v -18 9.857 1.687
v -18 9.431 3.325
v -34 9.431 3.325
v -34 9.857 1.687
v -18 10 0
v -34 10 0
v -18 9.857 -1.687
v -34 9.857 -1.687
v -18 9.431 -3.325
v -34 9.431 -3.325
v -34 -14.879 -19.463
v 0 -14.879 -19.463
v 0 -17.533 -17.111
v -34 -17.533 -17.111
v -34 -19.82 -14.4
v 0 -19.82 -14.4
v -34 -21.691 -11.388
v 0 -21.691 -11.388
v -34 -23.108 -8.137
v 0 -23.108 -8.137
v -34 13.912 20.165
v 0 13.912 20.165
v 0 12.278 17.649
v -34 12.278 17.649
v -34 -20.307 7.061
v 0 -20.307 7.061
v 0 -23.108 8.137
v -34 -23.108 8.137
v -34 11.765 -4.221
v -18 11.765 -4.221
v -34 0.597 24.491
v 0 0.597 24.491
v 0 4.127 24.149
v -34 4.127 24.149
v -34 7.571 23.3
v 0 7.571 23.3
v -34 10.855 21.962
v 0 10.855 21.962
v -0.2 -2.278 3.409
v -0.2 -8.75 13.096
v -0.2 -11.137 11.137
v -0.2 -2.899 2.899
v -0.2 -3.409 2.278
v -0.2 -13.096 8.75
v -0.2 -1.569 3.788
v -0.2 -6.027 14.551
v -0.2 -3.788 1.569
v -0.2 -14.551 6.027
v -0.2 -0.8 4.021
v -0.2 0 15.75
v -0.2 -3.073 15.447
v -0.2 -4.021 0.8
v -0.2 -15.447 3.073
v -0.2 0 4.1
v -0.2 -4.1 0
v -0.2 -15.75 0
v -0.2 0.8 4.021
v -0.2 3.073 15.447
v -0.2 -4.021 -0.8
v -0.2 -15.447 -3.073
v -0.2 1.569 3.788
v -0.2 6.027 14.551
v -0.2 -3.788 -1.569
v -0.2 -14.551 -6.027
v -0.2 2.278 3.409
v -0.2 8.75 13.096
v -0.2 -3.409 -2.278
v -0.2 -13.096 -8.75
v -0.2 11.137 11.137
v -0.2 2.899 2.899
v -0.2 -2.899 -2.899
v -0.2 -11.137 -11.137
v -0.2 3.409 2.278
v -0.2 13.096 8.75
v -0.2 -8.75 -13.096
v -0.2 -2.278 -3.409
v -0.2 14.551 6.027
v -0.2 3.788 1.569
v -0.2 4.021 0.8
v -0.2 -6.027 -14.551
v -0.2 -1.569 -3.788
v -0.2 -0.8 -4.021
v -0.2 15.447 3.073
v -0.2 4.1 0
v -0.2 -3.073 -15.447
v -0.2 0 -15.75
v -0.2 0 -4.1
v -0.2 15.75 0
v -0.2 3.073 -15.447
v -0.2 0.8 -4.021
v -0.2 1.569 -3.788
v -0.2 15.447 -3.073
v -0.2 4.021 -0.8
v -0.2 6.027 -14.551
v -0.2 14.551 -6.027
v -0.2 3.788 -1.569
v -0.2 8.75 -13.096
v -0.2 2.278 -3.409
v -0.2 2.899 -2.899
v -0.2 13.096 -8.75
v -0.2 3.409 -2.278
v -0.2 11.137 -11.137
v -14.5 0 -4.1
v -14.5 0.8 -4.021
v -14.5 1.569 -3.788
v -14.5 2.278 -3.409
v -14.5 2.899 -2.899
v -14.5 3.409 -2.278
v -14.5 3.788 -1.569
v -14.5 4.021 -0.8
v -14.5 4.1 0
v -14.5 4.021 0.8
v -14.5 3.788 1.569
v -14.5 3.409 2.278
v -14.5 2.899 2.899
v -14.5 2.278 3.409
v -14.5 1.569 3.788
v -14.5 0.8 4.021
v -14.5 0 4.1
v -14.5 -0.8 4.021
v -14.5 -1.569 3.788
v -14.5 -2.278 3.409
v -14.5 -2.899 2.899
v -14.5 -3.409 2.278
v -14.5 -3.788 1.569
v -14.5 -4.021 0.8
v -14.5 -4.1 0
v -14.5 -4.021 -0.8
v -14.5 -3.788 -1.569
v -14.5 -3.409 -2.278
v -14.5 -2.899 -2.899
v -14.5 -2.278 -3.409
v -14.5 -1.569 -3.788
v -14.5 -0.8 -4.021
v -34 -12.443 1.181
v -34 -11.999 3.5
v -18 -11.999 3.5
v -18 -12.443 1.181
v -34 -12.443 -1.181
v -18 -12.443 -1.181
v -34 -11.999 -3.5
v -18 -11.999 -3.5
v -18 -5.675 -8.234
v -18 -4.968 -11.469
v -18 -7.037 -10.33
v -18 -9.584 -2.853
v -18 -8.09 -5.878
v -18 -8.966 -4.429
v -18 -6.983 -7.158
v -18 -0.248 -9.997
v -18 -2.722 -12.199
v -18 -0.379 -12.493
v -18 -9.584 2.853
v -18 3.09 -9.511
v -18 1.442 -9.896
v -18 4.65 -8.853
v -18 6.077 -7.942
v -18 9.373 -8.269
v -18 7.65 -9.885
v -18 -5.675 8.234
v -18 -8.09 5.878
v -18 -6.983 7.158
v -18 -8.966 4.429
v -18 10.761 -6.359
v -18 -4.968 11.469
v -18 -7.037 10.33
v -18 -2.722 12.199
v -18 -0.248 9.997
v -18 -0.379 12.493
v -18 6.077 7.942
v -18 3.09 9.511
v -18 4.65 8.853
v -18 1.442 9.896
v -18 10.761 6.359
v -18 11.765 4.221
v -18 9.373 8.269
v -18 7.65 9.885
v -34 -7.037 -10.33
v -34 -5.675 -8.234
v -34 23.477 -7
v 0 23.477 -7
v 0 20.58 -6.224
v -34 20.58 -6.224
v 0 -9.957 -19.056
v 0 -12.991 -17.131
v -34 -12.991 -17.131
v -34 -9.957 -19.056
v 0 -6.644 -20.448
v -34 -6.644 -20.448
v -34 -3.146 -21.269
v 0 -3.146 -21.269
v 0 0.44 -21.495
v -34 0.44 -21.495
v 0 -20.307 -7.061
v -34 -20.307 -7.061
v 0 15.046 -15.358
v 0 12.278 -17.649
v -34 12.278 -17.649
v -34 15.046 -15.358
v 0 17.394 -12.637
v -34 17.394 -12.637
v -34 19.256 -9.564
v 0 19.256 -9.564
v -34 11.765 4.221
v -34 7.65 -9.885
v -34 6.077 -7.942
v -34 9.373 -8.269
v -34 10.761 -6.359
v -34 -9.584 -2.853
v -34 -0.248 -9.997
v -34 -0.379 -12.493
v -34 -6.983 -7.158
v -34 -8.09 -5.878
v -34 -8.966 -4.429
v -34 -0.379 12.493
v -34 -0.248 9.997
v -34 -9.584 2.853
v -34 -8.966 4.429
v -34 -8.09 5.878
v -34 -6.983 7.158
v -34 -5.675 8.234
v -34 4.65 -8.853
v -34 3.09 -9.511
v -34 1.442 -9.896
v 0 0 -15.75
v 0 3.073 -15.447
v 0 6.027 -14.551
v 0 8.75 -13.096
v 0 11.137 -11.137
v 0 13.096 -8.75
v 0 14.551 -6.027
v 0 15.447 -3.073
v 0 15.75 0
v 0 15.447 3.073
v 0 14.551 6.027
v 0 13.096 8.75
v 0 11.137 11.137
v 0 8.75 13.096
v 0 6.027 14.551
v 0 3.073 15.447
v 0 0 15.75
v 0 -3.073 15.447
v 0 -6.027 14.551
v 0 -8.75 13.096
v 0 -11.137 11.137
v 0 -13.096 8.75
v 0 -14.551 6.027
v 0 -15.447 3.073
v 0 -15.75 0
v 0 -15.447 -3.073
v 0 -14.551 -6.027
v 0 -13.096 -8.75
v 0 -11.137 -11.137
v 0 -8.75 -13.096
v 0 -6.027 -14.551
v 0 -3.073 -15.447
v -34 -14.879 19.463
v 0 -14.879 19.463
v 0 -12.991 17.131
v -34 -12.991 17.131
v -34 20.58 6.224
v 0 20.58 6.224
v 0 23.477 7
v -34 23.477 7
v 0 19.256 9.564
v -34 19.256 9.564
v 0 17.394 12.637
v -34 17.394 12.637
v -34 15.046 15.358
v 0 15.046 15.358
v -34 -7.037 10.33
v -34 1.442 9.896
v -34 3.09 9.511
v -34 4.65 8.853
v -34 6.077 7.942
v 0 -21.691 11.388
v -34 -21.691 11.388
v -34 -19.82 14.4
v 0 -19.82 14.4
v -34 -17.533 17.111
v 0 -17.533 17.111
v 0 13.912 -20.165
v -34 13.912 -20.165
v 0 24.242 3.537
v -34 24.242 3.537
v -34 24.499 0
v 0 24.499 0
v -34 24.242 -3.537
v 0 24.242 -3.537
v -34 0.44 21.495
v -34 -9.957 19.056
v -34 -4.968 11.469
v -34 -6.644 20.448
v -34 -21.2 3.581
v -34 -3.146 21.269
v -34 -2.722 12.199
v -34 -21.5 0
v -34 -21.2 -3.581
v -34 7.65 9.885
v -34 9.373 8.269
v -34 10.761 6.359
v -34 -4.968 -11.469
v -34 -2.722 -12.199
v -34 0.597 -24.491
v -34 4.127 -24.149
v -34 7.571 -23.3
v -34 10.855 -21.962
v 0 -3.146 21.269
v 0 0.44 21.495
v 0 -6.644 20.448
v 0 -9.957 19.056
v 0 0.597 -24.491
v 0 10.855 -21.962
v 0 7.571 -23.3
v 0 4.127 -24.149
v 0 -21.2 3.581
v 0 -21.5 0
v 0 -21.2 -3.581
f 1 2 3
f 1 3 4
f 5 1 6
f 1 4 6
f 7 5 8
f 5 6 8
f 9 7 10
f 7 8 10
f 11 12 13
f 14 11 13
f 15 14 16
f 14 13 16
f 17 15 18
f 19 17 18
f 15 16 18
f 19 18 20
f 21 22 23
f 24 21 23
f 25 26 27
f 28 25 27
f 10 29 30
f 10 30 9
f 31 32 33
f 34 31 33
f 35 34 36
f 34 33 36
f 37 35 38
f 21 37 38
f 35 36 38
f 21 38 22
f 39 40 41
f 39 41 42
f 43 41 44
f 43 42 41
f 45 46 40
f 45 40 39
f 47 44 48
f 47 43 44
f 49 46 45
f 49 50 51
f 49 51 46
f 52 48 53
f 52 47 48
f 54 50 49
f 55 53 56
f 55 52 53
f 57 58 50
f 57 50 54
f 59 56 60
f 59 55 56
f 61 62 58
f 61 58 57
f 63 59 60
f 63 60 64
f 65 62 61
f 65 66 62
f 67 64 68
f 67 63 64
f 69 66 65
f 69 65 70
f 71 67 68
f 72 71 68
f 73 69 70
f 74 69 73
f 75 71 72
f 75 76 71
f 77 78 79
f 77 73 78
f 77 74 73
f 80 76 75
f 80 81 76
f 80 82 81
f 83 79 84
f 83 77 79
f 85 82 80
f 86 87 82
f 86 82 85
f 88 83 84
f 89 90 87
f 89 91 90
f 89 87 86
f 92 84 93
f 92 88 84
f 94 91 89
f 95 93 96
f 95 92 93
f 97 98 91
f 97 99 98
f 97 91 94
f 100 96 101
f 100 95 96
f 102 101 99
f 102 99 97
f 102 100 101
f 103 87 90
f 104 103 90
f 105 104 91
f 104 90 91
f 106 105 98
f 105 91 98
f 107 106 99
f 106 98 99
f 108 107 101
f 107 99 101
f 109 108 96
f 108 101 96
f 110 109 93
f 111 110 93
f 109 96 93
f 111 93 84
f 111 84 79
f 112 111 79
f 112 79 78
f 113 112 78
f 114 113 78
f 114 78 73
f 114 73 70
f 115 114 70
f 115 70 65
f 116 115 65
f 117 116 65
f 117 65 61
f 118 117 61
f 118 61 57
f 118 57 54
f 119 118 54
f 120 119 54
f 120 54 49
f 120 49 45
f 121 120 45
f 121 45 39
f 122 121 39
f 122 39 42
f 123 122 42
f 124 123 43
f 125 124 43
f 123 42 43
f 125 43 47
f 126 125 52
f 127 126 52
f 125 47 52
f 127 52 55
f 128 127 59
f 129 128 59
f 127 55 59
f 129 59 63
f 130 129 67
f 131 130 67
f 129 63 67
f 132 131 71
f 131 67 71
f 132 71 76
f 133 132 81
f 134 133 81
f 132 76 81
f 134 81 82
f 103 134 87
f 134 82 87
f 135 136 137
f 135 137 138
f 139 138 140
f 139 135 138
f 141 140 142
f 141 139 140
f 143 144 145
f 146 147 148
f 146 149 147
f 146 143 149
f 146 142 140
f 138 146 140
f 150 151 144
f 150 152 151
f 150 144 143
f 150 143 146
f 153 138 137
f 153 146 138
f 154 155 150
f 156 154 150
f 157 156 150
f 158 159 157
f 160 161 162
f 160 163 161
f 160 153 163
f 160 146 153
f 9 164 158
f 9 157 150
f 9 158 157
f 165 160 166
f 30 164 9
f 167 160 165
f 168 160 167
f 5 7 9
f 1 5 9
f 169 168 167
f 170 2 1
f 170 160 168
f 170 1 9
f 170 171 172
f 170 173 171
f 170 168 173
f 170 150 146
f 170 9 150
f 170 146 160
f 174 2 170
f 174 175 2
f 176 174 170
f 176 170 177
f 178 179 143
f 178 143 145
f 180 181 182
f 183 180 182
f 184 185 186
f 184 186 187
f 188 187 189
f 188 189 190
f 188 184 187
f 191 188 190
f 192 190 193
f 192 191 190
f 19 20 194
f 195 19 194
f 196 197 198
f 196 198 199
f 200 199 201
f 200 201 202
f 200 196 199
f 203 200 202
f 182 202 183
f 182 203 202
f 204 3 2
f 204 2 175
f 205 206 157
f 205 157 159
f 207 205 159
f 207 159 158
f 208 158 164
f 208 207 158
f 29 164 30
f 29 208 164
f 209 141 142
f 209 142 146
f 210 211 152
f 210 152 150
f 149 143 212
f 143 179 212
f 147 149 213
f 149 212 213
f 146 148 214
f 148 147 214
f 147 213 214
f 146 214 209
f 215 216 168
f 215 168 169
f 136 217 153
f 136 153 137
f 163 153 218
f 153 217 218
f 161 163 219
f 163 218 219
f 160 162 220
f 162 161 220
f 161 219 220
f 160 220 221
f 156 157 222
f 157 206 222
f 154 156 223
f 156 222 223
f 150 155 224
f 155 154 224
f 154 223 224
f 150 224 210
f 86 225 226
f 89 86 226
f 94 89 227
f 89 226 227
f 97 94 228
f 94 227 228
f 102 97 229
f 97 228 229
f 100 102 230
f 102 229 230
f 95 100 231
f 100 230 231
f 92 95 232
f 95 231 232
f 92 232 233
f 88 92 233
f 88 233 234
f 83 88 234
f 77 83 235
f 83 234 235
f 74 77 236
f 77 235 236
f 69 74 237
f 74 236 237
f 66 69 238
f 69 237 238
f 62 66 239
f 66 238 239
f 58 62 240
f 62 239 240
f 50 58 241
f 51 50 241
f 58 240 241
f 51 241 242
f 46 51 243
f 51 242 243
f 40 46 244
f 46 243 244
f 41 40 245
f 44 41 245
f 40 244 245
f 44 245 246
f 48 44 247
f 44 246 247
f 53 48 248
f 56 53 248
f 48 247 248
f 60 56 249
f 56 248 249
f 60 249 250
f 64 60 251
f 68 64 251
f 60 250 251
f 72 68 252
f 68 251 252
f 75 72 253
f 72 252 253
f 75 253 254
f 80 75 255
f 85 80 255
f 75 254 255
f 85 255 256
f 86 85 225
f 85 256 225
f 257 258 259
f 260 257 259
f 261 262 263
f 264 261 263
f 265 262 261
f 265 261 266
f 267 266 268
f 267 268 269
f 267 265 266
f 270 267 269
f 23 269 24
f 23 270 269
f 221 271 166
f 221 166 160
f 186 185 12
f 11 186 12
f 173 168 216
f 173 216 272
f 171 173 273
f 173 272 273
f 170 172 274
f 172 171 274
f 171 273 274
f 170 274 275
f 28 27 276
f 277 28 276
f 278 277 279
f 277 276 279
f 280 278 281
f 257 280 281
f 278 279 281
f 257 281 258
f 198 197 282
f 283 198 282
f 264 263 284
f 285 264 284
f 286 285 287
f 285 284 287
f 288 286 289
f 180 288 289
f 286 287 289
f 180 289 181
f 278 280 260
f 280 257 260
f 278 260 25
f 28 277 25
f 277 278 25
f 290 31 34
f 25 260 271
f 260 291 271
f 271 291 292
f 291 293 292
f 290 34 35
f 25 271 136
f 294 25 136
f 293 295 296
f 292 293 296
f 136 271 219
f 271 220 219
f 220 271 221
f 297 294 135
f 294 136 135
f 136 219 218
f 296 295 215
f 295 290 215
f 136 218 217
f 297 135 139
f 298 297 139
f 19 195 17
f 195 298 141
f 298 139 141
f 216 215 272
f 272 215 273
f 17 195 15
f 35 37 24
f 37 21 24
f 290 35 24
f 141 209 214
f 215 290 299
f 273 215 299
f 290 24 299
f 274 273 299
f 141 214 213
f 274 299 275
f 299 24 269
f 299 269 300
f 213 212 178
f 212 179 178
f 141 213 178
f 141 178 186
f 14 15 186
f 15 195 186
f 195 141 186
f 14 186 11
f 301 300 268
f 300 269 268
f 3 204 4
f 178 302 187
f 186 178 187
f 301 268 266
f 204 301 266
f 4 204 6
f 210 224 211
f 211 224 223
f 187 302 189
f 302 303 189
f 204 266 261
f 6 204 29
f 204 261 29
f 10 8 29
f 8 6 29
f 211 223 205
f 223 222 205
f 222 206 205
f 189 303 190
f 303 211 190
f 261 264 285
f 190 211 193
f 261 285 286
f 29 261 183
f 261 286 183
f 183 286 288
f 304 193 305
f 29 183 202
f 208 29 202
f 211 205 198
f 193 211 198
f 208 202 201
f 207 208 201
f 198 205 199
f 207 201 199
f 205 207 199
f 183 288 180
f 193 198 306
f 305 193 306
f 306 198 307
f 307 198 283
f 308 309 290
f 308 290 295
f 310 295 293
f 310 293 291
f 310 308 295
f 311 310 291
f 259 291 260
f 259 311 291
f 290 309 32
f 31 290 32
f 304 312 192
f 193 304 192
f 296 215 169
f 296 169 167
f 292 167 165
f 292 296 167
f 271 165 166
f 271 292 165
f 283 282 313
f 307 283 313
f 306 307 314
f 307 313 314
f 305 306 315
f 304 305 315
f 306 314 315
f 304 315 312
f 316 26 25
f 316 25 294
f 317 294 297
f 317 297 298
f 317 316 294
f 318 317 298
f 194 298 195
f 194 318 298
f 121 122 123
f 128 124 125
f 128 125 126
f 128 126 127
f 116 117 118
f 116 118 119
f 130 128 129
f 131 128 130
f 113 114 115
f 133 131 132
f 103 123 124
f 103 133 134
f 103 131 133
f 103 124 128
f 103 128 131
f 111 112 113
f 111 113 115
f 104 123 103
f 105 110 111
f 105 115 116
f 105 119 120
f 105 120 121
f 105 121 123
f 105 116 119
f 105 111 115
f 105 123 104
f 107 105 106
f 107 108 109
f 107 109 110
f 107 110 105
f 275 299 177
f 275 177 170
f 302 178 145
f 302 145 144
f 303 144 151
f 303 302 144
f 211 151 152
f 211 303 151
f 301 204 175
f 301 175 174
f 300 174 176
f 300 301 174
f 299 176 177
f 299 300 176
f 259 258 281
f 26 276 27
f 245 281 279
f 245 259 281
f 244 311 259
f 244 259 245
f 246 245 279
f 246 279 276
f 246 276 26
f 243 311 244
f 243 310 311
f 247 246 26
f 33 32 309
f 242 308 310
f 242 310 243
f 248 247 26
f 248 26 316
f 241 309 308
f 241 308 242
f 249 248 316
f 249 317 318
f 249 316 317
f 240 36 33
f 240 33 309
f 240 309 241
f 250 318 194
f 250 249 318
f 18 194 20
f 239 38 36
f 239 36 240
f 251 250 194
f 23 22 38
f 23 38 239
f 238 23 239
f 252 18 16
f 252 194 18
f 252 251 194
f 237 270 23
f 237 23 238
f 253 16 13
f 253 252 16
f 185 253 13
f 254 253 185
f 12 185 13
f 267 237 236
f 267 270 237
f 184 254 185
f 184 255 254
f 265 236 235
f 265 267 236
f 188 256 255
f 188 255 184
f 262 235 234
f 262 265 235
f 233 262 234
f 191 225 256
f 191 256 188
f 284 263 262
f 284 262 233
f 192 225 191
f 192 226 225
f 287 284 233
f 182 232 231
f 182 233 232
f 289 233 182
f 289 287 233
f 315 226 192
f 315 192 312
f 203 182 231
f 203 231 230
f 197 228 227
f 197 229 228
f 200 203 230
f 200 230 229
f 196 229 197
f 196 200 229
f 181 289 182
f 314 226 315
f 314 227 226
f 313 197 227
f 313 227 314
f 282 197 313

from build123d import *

# Parameters (mm, degrees)
SKETCH4_R                 = 21.5
BOSS_EXTRUDE1_DEPTH       = 34
BOSS_EXTRUDE2_DEPTH       = 34
CIRPATTERN1_COUNT         = 5
SKETCH7_R                 = 10
SHORTSHAFT_KEY1_DEPTH     = 16
SHORTSHAFT_KEY2_DEPTH     = 16
SHORTSHAFT_KEY_PATT_COUNT = 5
SKETCH10_R                = 15.75
PULLEYINDENTATION_DEPTH   = 0.2
SKETCH11_R                = 4.1
METAL_SHAFT_HOLE_DEPTH    = 14.5


with BuildPart() as part:
    # Sketch4 → Boss-Extrude1 (new body)
    with BuildSketch(Plane(origin=(0, 0, 0), x_dir=(0, 0, -1), z_dir=(1, 0, 0))):
        Circle(SKETCH4_R)
    extrude(amount=-BOSS_EXTRUDE1_DEPTH)

    # Sketch5 → Boss-Extrude2 (add)
    with BuildSketch(Plane(origin=(0, 0, 0), x_dir=(0, 0, -1), z_dir=(1, 0, 0))):
        with BuildLine():
            Line((-6.223542865, 20.579541156), (-7, 23.477318635))
            ThreePointArc((-7, 23.477318635), (0, 24.498663031), (7, 23.477318635))
            Line((7, 23.477318635), (6.223542865, 20.579541156))
            ThreePointArc((6.223542865, 20.579541156), (0, 21.5), (-6.223542865, 20.579541156))
        make_face()
    boss_extrude2 = extrude(amount=-BOSS_EXTRUDE2_DEPTH)

    # CirPattern1: Boss-Extrude2 ×5 about axis
    cirpattern1_axis = Axis((0, 0, 0), (1, 0, 0))
    for i in range(1, CIRPATTERN1_COUNT):
        add(boss_extrude2.rotate(cirpattern1_axis, i * 360 / CIRPATTERN1_COUNT))

    # Sketch7 → ShortShaft Key1 (cut)
    with BuildSketch(Plane.ZY.offset(34)):
        Circle(SKETCH7_R)
    extrude(amount=-SHORTSHAFT_KEY1_DEPTH, mode=Mode.SUBTRACT)

    # Sketch8 → ShortShaft Key2 (cut)
    with BuildSketch(Plane.ZY.offset(34)):
        with BuildLine():
            Line((-7.941654077, 6.077016581), (-9.88451898, 7.650317559))
            ThreePointArc((-9.88451898, 7.650317559), (-7.346870668, 10.11209996), (-4.22140002, 11.764814325))
            Line((-4.22140002, 11.764814325), (-3.325480146, 9.430863258))
            ThreePointArc((-3.325480146, 9.430863258), (-5.877852523, 8.090169944), (-7.941654077, 6.077016581))
        make_face()
    shortshaft_key2 = extrude(amount=-SHORTSHAFT_KEY2_DEPTH, mode=Mode.SUBTRACT)

    # ShortShaft Key Patt: ShortShaft Key2 ×5 about axis
    shortshaft_key_patt_axis = Axis((0, 0, 0), (1, 0, 0))
    for i in range(1, SHORTSHAFT_KEY_PATT_COUNT):
        add(shortshaft_key2.rotate(shortshaft_key_patt_axis, i * 360 / SHORTSHAFT_KEY_PATT_COUNT), mode=Mode.SUBTRACT)

    # Sketch10 → PulleyIndentation (cut)
    with BuildSketch(Plane(origin=(0, 0, 0), x_dir=(0, 0, -1), z_dir=(1, 0, 0))):
        Circle(SKETCH10_R)
    extrude(amount=-PULLEYINDENTATION_DEPTH, mode=Mode.SUBTRACT)

    # Sketch11 → Metal Shaft Hole (cut)
    with BuildSketch(Plane(origin=(0, 0, 0), x_dir=(0, 0, -1), z_dir=(1, 0, 0))):
        Circle(SKETCH11_R)
    extrude(amount=-METAL_SHAFT_HOLE_DEPTH, mode=Mode.SUBTRACT)


solid = part.part
